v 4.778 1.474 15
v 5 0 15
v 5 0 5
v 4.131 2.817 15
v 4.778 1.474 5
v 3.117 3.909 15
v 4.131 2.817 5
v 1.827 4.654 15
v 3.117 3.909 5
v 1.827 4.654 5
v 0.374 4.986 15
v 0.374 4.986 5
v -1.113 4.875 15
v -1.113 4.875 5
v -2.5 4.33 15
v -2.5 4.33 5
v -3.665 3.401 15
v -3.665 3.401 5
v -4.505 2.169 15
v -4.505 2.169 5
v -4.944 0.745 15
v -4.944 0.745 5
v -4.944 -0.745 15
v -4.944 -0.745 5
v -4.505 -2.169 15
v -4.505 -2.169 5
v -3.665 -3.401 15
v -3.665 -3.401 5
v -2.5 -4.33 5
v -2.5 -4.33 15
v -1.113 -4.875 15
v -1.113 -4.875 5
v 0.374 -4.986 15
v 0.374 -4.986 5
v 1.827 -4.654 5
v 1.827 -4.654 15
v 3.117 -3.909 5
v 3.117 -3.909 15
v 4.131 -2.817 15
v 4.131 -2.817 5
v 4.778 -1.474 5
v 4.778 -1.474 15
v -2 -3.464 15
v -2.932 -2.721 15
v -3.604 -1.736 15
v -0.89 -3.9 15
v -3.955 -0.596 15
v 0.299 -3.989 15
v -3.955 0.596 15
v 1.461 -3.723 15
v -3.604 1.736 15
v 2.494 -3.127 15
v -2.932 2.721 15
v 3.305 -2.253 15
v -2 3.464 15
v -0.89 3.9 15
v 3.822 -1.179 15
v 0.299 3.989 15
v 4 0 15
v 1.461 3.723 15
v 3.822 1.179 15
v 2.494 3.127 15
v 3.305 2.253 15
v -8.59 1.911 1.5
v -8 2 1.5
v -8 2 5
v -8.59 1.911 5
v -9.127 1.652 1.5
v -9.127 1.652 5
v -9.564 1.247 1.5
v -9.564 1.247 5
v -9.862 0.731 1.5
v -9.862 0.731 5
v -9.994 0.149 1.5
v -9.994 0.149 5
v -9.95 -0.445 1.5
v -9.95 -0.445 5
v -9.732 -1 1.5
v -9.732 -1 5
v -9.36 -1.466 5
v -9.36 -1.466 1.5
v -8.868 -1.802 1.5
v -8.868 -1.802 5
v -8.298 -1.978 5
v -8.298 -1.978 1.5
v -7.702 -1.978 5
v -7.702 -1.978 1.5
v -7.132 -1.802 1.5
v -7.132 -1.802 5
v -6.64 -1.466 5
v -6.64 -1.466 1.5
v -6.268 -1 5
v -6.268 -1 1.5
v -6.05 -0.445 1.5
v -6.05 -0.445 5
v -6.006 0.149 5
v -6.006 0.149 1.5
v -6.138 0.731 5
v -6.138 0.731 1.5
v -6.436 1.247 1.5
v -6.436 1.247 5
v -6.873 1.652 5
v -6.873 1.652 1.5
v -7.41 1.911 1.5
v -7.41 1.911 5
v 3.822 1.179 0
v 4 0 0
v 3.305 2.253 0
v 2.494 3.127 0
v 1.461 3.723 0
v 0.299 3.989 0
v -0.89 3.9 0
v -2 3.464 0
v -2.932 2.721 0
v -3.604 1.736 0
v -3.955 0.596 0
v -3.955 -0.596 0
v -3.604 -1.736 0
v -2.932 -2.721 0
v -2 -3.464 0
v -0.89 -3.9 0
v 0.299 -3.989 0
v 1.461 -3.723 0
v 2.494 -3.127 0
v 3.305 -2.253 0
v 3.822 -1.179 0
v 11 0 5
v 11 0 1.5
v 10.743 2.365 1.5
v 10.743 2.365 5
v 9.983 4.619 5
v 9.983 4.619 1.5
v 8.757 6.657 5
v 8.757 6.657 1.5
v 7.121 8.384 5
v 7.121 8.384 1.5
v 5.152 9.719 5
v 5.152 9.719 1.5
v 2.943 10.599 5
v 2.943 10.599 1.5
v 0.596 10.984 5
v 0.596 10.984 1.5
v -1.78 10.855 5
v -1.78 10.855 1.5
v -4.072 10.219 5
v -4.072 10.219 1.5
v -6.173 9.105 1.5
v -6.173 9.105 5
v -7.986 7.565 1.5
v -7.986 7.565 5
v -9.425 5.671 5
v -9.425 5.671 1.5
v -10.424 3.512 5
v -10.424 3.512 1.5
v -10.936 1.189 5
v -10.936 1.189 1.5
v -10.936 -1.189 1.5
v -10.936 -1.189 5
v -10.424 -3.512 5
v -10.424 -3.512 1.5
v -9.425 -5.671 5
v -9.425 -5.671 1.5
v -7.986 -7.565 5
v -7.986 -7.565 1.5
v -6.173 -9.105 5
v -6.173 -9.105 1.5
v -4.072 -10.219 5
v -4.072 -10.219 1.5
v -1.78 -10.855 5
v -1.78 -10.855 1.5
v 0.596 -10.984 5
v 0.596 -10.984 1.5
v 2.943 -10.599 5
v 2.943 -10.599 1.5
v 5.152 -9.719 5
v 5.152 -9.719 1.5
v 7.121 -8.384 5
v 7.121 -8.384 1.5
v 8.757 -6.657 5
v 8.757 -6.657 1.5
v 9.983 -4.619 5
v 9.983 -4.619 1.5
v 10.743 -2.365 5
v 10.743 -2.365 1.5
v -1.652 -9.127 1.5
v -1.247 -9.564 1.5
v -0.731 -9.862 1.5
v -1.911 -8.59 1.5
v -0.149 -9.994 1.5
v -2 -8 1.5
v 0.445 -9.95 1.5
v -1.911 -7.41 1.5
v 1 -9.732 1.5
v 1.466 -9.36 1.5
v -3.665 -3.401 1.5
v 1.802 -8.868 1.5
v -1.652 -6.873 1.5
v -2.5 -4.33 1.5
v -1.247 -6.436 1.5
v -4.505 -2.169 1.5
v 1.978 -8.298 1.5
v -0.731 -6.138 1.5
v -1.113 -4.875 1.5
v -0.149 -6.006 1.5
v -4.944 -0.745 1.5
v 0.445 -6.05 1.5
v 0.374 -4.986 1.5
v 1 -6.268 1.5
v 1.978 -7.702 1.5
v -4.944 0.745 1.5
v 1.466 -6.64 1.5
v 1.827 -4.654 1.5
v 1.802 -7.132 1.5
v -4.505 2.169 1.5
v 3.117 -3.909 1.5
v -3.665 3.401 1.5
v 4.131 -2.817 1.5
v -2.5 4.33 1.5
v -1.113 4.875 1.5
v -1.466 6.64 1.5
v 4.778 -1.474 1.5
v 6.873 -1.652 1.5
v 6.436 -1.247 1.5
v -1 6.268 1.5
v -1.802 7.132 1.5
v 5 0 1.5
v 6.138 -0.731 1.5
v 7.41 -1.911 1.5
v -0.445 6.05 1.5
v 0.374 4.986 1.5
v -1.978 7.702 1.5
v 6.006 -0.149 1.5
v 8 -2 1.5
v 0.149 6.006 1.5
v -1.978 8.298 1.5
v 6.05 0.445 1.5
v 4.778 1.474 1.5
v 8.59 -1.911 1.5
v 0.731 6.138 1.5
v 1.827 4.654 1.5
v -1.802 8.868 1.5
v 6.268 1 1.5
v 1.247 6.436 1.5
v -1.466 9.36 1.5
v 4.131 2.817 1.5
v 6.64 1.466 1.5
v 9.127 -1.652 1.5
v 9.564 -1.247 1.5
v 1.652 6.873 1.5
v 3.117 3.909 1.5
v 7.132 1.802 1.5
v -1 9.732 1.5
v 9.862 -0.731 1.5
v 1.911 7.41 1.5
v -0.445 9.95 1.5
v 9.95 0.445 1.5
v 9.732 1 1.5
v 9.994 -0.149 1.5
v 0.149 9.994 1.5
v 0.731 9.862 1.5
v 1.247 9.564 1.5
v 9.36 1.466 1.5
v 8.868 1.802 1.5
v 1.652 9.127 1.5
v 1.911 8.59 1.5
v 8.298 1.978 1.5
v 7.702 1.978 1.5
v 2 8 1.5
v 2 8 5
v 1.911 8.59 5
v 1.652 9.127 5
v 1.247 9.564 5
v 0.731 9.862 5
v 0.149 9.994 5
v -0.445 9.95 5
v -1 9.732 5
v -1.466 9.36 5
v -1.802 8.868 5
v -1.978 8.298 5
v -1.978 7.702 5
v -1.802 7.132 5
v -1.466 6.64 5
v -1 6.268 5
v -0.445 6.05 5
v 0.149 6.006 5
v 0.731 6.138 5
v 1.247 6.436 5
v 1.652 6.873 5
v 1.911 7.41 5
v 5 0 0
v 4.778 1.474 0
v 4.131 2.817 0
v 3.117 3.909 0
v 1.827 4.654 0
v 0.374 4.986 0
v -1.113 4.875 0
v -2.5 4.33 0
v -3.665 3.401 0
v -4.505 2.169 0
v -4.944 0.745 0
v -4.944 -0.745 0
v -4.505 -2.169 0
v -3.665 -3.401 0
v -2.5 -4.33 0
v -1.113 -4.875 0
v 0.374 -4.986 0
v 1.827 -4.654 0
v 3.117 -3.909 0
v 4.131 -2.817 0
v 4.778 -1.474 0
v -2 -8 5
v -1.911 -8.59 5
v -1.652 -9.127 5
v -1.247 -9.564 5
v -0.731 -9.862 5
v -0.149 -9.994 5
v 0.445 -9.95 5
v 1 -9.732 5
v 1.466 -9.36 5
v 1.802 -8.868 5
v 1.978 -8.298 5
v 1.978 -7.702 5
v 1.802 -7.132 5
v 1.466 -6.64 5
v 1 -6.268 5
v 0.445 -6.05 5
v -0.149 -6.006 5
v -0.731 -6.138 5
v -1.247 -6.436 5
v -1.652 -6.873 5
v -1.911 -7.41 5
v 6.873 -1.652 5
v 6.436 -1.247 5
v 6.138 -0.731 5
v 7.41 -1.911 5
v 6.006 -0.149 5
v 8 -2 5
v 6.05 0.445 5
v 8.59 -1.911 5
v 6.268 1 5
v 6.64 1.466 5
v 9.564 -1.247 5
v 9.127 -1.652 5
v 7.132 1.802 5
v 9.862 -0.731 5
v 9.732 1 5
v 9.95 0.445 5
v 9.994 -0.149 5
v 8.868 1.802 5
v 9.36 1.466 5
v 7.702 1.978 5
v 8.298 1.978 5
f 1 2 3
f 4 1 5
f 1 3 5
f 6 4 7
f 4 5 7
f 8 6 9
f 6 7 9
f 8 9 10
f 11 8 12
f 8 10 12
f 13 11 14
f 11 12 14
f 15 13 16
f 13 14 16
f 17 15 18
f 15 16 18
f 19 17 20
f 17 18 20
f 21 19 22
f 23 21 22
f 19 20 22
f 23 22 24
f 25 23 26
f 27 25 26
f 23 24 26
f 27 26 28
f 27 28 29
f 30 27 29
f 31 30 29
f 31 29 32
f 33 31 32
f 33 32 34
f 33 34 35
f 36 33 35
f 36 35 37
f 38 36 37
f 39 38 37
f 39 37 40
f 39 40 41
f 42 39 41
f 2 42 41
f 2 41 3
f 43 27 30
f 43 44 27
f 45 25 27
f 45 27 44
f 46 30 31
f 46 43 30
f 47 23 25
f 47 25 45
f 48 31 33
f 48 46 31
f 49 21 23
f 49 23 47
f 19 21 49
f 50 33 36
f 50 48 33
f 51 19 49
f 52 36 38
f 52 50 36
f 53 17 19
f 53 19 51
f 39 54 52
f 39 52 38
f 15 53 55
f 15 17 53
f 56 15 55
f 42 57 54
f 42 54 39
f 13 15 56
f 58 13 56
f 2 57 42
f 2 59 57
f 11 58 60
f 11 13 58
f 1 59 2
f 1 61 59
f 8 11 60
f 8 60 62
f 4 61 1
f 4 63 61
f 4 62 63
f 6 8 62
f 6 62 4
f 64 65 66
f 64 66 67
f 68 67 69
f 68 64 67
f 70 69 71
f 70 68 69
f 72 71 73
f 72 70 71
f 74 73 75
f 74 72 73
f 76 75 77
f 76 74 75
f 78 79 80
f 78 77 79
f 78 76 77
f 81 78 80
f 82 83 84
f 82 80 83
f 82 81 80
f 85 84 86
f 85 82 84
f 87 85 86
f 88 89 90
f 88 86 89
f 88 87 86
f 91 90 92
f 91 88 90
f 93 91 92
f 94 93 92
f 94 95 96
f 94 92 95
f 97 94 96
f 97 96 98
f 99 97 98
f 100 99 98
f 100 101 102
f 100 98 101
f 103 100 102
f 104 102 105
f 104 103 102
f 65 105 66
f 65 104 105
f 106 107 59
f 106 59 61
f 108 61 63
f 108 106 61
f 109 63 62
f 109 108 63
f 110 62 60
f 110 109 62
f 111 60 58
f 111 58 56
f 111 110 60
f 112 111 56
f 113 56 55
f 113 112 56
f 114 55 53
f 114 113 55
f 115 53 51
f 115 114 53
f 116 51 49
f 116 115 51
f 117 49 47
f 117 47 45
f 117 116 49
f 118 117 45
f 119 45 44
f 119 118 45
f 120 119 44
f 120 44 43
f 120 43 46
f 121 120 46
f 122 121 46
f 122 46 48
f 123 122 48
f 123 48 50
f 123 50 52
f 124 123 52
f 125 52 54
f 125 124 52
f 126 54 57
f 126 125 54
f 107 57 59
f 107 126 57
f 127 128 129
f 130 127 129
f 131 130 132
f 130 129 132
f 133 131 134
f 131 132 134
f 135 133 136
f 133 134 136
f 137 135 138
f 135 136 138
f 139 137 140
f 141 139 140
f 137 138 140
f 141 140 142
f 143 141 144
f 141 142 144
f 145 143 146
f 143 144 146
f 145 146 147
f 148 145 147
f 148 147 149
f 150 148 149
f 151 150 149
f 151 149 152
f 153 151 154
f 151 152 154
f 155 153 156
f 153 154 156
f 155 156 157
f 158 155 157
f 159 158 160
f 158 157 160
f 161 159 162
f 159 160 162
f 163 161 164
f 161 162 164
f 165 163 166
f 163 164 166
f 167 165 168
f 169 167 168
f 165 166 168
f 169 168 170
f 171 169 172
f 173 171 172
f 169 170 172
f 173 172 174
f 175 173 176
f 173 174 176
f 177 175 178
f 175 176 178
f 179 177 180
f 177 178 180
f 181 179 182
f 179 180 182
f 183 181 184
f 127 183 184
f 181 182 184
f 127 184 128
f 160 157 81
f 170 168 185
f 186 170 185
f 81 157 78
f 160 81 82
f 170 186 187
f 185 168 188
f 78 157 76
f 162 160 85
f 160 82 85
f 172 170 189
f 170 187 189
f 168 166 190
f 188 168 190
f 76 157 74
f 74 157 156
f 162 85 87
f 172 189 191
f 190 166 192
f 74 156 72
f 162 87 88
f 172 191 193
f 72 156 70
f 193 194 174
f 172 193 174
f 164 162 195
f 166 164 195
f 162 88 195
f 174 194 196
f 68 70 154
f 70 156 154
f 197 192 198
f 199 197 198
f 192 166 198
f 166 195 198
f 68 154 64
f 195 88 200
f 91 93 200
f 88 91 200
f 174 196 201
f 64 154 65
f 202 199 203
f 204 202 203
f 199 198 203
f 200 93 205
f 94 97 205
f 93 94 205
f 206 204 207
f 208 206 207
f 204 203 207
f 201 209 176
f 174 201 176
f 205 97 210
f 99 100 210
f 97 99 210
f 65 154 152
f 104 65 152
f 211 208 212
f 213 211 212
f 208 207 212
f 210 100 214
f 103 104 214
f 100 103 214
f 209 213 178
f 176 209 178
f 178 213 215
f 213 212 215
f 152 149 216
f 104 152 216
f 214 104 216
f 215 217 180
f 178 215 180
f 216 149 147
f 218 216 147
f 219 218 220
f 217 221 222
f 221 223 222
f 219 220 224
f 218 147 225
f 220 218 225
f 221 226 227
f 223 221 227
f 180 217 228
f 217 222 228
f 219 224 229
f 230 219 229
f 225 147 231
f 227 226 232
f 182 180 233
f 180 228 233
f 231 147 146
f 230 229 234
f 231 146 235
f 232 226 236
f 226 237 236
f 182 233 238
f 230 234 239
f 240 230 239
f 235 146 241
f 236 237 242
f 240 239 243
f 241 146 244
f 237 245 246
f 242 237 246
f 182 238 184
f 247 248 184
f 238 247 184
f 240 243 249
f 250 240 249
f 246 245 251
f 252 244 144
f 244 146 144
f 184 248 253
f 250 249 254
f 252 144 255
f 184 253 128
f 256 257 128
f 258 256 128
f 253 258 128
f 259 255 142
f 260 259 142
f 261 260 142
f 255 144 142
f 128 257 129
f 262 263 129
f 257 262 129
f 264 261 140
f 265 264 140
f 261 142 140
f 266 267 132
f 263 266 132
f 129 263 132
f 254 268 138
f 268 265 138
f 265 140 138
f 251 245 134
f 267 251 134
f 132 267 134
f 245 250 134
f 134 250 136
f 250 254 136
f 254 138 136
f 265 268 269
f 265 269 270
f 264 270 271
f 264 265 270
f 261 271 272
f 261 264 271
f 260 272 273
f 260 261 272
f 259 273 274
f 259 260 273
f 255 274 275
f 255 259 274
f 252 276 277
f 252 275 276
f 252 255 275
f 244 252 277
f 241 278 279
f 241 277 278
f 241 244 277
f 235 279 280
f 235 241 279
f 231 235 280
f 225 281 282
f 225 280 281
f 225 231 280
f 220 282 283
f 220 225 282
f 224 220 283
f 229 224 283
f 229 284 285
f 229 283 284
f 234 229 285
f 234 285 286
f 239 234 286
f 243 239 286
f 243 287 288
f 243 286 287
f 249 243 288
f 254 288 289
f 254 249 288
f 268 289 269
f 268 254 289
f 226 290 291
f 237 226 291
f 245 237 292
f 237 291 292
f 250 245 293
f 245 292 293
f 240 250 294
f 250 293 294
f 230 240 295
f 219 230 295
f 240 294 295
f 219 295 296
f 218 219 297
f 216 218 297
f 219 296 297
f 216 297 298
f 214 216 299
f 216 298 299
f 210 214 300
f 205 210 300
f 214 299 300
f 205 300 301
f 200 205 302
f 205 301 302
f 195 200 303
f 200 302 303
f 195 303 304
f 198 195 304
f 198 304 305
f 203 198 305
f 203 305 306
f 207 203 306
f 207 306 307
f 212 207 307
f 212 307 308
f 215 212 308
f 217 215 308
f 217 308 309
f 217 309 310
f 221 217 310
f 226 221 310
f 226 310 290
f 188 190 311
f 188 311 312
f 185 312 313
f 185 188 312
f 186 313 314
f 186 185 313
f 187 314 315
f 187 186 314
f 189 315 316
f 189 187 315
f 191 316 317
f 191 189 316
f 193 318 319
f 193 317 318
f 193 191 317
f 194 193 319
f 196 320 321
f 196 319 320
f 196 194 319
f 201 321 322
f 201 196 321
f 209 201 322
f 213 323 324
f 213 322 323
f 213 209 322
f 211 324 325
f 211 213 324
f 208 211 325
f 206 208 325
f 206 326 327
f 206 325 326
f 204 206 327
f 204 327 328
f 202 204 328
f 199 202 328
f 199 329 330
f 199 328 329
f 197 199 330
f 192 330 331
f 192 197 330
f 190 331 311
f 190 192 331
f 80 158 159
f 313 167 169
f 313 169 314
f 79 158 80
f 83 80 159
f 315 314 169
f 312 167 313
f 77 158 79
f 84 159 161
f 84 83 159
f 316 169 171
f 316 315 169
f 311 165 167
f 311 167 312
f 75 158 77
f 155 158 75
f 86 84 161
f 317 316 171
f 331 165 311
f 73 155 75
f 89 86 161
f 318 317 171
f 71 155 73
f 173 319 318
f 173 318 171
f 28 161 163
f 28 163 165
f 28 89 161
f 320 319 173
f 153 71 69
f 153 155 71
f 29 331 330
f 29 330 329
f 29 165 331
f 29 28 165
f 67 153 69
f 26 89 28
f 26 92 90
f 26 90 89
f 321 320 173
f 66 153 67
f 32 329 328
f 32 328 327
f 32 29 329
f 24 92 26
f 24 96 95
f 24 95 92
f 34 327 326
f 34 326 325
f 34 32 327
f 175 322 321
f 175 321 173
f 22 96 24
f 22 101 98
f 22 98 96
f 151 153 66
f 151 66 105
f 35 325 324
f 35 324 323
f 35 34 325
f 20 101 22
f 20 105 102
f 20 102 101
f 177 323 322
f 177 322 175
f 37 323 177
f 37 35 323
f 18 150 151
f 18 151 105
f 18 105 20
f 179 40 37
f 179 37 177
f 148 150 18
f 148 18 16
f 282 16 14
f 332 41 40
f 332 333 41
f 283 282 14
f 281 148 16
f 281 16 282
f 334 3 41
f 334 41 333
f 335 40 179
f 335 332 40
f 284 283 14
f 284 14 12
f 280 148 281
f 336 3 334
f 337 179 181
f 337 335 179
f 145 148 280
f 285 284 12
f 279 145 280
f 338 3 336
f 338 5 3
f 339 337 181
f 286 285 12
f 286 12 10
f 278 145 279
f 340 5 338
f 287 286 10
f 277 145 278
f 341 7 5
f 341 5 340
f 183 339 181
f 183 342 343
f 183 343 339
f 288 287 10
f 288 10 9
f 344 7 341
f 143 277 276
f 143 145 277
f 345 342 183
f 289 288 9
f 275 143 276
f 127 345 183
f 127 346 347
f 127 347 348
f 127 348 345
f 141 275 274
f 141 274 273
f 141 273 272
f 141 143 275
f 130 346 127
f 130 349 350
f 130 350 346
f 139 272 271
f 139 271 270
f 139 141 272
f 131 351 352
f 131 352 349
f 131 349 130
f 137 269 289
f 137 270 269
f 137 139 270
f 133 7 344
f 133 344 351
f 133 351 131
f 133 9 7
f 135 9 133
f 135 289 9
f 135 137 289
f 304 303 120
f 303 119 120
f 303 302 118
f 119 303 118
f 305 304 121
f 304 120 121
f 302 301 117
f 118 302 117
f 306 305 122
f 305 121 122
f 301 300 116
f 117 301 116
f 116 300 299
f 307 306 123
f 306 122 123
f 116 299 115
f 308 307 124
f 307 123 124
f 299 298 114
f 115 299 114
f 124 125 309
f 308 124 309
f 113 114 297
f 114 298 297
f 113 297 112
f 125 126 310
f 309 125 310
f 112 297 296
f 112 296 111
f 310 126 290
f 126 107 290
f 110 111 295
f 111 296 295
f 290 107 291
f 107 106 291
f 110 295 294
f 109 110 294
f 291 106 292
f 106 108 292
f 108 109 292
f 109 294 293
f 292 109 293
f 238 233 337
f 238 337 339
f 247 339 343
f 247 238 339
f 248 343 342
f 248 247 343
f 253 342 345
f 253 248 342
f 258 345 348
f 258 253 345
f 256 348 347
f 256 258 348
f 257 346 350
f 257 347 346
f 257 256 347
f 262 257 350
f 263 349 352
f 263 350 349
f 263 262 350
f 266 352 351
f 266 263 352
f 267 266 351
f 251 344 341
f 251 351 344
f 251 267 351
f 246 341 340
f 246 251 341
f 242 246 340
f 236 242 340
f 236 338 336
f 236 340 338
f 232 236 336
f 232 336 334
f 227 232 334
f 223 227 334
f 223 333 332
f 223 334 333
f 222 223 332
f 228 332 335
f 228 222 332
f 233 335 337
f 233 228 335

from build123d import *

# Parameters (mm, degrees)
ESQUISSE1_R                  = 5
ESQUISSE1_R_2                = 4
BOSS_EXTRU_1_DEPTH           = 15
BOSS_EXTRU_2_START           = 1.5
ESQUISSE2_R                  = 11
ESQUISSE2_R_2                = 5
BOSS_EXTRU_2_DEPTH           = 3.5
ESQUISSE3_R                  = 2
ENL_V_MAT_EXTRU_1_DEPTH      = 22.610182785
R_P_TITION_CIRCULAIRE1_COUNT = 4


with BuildPart() as part:
    # Esquisse1 → Boss.-Extru.1 (new body)
    with BuildSketch(Plane.XY):
        Circle(ESQUISSE1_R)
        Circle(ESQUISSE1_R_2, mode=Mode.SUBTRACT)
    extrude(amount=BOSS_EXTRU_1_DEPTH)

    # Esquisse2 → Boss.-Extru.2 (add)
    with BuildSketch(Plane.XY.offset(BOSS_EXTRU_2_START)):
        Circle(ESQUISSE2_R)
        Circle(ESQUISSE2_R_2, mode=Mode.SUBTRACT)
    extrude(amount=BOSS_EXTRU_2_DEPTH)

    # Esquisse3 → Enlèv. mat.-Extru.1 (cut, through all)
    with BuildSketch(Plane.XY):
        with Locations((0, 8)):
            Circle(ESQUISSE3_R)
    enl_v_mat_extru_1 = extrude(amount=ENL_V_MAT_EXTRU_1_DEPTH, mode=Mode.SUBTRACT)

    # Répétition circulaire1: Enlèv. mat.-Extru.1 ×4 about axis
    r_p_tition_circulaire1_axis = Axis((0, 0, 0), (0, 0, 1))
    for i in range(1, R_P_TITION_CIRCULAIRE1_COUNT):
        add(enl_v_mat_extru_1.rotate(r_p_tition_circulaire1_axis, i * 360 / R_P_TITION_CIRCULAIRE1_COUNT), mode=Mode.SUBTRACT)


solid = part.part
